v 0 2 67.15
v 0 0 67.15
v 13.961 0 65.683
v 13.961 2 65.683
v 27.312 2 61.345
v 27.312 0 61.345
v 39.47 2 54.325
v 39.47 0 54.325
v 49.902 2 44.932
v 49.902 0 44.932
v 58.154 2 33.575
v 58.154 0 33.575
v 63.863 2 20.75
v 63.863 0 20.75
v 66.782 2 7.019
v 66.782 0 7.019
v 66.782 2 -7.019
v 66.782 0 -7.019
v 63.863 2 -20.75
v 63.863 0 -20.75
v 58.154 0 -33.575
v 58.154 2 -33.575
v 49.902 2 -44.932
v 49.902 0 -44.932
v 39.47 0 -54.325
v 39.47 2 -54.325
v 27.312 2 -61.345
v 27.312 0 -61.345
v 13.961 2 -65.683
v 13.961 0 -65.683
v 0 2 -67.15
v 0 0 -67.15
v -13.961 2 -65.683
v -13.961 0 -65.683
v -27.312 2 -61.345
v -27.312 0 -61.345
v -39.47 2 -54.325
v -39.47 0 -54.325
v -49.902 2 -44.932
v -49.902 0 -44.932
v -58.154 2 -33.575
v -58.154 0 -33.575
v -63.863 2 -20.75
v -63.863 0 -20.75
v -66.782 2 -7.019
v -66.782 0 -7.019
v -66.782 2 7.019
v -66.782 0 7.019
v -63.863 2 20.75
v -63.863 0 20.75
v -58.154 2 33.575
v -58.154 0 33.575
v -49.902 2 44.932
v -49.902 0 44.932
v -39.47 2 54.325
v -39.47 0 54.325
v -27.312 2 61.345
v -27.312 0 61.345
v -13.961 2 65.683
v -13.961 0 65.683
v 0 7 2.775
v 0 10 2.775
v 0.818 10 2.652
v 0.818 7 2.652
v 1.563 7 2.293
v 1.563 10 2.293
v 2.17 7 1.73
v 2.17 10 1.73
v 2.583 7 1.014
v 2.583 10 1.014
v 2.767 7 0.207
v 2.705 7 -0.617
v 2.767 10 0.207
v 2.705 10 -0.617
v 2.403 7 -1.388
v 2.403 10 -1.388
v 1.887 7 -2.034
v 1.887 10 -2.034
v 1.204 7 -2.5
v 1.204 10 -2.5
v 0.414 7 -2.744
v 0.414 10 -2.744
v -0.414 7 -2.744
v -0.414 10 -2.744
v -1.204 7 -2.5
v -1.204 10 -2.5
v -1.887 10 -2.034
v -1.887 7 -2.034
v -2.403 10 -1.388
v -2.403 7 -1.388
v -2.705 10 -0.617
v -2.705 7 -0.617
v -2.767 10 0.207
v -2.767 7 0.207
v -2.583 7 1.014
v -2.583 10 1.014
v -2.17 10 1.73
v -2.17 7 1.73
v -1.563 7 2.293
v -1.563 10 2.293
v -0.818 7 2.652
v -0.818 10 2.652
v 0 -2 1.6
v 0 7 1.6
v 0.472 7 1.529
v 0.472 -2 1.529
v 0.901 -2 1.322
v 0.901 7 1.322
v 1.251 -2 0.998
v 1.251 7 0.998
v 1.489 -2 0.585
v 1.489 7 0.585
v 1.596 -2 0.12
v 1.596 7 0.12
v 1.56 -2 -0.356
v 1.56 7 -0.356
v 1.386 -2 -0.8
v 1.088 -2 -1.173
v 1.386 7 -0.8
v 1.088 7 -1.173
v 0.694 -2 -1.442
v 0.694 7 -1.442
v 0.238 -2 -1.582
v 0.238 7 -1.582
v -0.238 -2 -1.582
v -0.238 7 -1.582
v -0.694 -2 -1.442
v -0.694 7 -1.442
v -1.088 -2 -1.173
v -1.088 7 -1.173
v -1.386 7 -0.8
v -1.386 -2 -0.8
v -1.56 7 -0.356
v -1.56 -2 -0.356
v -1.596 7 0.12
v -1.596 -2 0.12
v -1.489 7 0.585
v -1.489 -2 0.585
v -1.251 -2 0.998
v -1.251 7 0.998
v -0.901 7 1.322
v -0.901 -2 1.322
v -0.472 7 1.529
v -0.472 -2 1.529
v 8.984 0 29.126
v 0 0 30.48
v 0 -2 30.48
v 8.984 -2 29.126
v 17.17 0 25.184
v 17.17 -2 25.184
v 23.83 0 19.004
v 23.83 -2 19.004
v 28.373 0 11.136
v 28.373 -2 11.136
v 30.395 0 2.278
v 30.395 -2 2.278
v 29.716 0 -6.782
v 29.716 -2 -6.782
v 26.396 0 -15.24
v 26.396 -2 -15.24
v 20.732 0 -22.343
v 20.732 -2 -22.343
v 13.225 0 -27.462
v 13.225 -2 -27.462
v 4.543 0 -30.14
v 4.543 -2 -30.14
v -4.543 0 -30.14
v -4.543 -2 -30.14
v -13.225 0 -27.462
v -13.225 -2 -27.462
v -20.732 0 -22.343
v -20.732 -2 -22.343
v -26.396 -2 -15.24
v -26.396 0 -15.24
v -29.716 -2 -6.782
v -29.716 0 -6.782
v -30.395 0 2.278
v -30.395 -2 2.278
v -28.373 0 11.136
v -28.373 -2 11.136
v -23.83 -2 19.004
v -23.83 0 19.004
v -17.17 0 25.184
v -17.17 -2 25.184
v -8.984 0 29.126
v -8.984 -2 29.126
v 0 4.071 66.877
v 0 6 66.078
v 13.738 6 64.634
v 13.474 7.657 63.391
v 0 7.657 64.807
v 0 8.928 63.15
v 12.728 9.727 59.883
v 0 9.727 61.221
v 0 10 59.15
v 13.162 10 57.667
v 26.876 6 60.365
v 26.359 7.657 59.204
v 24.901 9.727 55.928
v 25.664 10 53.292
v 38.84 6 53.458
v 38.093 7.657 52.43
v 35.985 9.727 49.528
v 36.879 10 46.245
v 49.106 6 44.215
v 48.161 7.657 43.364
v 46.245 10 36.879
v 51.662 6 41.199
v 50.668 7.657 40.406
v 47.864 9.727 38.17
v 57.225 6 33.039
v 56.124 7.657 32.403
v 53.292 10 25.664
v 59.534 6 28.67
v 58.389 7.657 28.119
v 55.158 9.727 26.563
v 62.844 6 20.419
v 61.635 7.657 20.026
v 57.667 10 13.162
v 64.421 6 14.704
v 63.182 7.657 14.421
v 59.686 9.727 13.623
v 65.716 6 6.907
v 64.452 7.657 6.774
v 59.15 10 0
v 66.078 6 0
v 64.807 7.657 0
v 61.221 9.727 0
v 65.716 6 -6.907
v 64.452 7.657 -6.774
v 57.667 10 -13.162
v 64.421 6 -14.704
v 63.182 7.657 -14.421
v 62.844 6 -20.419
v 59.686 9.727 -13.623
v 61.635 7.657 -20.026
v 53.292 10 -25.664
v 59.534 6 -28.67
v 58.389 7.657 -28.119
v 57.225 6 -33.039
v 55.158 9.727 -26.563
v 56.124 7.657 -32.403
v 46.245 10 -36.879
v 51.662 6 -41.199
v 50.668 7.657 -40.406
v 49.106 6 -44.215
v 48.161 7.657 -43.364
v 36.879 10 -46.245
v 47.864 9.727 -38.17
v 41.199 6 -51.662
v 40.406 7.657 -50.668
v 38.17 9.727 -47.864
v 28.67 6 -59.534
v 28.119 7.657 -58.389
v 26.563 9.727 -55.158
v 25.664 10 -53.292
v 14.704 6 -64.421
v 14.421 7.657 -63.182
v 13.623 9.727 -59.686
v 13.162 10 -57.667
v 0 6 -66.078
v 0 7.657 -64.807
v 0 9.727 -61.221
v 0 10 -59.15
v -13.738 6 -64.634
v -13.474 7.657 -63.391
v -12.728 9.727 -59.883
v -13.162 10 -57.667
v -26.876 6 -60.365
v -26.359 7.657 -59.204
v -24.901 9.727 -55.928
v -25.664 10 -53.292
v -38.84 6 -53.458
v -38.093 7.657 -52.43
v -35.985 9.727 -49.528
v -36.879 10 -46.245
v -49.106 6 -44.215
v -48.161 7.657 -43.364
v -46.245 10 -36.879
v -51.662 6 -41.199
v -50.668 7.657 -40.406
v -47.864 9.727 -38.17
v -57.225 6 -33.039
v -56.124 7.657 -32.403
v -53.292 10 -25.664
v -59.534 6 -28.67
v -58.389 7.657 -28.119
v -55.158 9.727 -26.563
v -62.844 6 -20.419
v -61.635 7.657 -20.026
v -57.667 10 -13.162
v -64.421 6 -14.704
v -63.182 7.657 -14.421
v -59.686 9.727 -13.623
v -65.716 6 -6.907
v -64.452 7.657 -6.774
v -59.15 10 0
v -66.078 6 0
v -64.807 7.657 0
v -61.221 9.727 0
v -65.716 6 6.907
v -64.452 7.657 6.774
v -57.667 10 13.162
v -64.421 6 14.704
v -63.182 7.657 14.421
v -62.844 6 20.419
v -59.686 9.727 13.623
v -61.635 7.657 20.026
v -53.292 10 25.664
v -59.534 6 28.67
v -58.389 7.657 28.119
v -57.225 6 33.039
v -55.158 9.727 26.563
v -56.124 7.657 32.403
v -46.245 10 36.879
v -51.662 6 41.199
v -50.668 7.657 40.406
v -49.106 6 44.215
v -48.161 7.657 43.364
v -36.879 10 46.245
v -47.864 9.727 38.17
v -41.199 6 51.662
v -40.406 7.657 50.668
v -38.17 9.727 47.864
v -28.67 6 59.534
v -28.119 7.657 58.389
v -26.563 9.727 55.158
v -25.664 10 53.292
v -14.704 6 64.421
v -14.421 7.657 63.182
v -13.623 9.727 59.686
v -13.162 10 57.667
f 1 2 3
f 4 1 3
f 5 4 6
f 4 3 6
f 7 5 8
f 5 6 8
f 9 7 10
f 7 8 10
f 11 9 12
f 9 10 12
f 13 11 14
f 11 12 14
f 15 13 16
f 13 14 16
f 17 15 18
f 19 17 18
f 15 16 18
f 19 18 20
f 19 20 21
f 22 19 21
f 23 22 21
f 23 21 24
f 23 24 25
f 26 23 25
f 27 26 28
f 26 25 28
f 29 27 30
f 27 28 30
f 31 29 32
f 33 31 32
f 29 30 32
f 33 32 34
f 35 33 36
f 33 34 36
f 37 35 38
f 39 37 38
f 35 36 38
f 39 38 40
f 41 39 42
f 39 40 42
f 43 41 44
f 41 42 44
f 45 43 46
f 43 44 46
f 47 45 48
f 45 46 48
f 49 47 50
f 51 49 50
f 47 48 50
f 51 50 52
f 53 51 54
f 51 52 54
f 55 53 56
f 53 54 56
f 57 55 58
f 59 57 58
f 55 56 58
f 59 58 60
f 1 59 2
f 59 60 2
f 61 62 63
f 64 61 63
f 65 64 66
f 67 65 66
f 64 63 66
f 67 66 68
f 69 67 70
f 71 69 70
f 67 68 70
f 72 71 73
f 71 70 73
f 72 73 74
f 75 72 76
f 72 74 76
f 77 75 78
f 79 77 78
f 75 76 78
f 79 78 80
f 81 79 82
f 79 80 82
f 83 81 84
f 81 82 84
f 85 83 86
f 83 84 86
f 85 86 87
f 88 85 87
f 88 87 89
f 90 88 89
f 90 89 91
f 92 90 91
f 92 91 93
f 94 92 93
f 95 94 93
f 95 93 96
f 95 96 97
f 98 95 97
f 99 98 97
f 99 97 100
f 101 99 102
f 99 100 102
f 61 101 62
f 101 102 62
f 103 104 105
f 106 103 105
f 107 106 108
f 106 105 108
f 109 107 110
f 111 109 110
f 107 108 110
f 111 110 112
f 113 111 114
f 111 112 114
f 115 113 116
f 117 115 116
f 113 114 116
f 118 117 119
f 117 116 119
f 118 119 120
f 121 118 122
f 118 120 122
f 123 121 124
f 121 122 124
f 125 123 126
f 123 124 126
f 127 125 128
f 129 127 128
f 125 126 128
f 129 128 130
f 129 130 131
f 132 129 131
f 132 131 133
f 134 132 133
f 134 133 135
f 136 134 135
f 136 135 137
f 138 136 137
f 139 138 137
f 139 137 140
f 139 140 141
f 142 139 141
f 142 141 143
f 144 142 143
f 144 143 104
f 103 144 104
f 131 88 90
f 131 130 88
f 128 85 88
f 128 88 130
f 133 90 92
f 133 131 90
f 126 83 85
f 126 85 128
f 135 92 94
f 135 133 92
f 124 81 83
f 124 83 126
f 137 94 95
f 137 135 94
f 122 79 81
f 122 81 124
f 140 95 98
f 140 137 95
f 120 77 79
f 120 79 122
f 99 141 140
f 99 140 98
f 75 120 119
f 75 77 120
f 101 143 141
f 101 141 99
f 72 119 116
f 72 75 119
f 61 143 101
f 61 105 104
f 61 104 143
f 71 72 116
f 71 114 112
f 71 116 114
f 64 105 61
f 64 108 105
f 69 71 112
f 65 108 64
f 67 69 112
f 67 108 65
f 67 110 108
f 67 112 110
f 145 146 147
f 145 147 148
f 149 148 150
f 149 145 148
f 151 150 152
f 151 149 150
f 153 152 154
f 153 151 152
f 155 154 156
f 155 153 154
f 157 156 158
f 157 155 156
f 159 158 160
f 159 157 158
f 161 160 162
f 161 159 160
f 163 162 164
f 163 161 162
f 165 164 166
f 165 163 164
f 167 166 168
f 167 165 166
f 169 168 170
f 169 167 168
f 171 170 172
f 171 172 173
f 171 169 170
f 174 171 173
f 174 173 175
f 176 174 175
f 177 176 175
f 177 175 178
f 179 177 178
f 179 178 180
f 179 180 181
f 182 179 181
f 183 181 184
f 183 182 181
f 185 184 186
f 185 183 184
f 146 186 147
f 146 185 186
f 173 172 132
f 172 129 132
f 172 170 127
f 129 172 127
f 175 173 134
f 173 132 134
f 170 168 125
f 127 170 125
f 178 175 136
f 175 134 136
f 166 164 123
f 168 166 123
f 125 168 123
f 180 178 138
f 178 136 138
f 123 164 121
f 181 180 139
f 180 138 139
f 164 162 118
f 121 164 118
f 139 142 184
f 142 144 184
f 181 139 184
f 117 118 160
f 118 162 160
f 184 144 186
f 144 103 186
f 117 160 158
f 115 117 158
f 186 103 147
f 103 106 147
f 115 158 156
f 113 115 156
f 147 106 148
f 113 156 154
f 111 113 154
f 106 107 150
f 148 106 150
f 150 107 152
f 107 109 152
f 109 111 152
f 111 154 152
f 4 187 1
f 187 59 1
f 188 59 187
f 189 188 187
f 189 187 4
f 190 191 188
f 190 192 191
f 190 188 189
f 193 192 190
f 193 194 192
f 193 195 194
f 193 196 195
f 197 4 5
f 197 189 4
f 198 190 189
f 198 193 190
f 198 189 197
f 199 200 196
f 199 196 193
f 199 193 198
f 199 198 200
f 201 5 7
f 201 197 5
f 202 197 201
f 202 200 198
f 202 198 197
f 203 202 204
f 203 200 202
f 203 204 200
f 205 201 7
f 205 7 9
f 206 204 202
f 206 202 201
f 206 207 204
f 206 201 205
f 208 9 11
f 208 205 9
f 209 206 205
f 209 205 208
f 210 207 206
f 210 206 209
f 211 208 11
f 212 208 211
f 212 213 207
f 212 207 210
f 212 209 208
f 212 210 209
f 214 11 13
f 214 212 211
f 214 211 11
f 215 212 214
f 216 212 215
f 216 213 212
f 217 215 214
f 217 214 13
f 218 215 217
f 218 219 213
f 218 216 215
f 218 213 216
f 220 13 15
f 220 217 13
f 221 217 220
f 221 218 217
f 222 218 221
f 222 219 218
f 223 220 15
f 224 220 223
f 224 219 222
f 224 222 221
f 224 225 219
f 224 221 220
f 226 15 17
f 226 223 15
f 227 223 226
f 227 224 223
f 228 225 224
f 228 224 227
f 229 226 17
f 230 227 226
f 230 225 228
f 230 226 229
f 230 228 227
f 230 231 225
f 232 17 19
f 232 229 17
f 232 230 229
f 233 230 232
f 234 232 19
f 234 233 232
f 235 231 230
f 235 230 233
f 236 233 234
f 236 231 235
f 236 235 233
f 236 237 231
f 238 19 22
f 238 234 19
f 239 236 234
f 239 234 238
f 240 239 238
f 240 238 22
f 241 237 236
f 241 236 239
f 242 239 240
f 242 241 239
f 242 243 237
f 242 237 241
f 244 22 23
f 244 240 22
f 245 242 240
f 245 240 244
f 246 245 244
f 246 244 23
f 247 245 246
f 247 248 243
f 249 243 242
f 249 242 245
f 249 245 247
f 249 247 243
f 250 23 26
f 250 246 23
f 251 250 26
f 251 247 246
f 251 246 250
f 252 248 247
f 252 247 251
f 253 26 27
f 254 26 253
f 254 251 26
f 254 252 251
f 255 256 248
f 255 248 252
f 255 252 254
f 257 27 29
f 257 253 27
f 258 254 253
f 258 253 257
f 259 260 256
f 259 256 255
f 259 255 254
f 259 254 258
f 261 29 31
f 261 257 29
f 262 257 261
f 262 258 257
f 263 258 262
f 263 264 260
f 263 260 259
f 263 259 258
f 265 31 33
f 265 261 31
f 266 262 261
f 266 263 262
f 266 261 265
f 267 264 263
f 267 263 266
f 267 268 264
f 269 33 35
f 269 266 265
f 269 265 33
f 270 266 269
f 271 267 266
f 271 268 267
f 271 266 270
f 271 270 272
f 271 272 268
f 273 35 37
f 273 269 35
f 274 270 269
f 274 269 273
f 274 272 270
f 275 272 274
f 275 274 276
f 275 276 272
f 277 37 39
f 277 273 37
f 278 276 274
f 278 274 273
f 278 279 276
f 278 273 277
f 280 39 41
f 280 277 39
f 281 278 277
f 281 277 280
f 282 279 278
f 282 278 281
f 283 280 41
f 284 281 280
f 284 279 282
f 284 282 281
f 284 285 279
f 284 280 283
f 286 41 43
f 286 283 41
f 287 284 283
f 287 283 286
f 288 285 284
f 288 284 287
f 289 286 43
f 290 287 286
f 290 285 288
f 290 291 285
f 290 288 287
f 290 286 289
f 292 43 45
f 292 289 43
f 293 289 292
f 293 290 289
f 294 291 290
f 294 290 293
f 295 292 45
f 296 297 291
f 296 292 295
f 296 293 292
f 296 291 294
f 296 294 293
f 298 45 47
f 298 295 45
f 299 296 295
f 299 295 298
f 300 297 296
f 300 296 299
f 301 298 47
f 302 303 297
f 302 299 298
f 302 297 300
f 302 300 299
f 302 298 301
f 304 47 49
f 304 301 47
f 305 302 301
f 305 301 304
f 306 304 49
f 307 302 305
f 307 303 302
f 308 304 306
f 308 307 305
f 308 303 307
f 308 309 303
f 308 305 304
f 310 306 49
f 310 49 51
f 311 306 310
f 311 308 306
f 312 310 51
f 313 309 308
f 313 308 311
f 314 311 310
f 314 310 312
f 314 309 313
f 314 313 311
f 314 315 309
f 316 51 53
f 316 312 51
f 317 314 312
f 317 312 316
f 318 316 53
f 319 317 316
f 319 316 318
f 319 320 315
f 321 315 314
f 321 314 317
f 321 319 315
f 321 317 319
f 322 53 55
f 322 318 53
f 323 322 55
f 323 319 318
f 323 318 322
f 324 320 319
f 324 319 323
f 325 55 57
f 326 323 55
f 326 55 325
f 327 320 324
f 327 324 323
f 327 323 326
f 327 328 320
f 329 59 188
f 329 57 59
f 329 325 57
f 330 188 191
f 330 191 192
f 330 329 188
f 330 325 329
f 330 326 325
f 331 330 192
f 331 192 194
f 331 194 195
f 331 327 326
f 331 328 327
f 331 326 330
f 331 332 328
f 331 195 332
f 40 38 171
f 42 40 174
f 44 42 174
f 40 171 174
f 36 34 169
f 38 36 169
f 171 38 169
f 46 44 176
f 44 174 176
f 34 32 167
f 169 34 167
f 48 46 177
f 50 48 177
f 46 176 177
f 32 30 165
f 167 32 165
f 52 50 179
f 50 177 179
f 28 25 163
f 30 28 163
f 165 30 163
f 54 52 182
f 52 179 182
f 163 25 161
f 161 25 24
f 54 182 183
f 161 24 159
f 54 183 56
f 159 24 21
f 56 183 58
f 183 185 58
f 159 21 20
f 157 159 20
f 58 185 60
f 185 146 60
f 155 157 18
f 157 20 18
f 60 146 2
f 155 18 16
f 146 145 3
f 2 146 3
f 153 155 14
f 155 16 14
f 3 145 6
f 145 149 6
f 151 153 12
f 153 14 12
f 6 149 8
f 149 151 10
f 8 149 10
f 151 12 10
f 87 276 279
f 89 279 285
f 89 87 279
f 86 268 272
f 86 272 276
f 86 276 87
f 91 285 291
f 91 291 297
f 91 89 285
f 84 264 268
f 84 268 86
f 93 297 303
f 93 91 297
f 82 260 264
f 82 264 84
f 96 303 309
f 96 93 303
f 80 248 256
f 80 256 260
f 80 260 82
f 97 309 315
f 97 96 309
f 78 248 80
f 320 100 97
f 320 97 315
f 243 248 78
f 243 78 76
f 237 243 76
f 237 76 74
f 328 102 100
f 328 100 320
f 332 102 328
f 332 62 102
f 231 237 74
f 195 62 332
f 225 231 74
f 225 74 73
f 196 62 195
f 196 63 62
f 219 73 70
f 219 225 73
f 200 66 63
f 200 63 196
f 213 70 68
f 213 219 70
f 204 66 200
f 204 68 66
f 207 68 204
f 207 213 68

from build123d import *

# Parameters (mm, degrees)
SKETCH1_R           = 67.15
BOSS_EXTRUDE1_DEPTH = 10
SKETCH1_3_R         = 30.48
BOSS_EXTRUDE2_DEPTH = 2
FILLET1_R           = 8
SKETCH2_R           = 2.775
CUT_EXTRUDE1_DEPTH  = 3
CUT_EXTRUDE2_REACH  = 97.39
SKETCH3_R           = 1.6


with BuildPart() as part:
    # Sketch1 → Boss-Extrude1 (new body)
    with BuildSketch(Plane(origin=(0, 0, 0), x_dir=(1, 0, 0), z_dir=(0, 1, 0))):
        Circle(SKETCH1_R)
    extrude(amount=BOSS_EXTRUDE1_DEPTH)

    # Sketch1<3> → Boss-Extrude2 (add)
    with BuildSketch(Plane(origin=(0, 0, 0), x_dir=(1, 0, 0), z_dir=(0, 1, 0))):
        Circle(SKETCH1_3_R)
    extrude(amount=-BOSS_EXTRUDE2_DEPTH)

    # Fillet1
    fillet1_edges = [part.edges().sort_by_distance(p)[0] for p in [
        (-67.15, 10, 0),
    ]]
    fillet(fillet1_edges, radius=FILLET1_R)

    # Sketch2 → Cut-Extrude1 (cut)
    with BuildSketch(Plane(origin=(0, 10, 0), x_dir=(1, 0, 0), z_dir=(0, 1, 0))):
        Circle(SKETCH2_R)
    extrude(amount=-CUT_EXTRUDE1_DEPTH, mode=Mode.SUBTRACT)

    # Sketch3 → Cut-Extrude2 (cut, up to next)
    with BuildSketch(Plane(origin=(0, 7, 0), x_dir=(1, 0, 0), z_dir=(0, 1, 0)), mode=Mode.PRIVATE) as cut_extrude2_sk1:
        Circle(SKETCH3_R)
    cut_extrude2_tool1 = extrude(cut_extrude2_sk1.sketch, amount=-CUT_EXTRUDE2_REACH, mode=Mode.PRIVATE) & part.part
    add(cut_extrude2_tool1.solids().sort_by_distance((0, 7, 0))[0], mode=Mode.SUBTRACT)


solid = part.part
